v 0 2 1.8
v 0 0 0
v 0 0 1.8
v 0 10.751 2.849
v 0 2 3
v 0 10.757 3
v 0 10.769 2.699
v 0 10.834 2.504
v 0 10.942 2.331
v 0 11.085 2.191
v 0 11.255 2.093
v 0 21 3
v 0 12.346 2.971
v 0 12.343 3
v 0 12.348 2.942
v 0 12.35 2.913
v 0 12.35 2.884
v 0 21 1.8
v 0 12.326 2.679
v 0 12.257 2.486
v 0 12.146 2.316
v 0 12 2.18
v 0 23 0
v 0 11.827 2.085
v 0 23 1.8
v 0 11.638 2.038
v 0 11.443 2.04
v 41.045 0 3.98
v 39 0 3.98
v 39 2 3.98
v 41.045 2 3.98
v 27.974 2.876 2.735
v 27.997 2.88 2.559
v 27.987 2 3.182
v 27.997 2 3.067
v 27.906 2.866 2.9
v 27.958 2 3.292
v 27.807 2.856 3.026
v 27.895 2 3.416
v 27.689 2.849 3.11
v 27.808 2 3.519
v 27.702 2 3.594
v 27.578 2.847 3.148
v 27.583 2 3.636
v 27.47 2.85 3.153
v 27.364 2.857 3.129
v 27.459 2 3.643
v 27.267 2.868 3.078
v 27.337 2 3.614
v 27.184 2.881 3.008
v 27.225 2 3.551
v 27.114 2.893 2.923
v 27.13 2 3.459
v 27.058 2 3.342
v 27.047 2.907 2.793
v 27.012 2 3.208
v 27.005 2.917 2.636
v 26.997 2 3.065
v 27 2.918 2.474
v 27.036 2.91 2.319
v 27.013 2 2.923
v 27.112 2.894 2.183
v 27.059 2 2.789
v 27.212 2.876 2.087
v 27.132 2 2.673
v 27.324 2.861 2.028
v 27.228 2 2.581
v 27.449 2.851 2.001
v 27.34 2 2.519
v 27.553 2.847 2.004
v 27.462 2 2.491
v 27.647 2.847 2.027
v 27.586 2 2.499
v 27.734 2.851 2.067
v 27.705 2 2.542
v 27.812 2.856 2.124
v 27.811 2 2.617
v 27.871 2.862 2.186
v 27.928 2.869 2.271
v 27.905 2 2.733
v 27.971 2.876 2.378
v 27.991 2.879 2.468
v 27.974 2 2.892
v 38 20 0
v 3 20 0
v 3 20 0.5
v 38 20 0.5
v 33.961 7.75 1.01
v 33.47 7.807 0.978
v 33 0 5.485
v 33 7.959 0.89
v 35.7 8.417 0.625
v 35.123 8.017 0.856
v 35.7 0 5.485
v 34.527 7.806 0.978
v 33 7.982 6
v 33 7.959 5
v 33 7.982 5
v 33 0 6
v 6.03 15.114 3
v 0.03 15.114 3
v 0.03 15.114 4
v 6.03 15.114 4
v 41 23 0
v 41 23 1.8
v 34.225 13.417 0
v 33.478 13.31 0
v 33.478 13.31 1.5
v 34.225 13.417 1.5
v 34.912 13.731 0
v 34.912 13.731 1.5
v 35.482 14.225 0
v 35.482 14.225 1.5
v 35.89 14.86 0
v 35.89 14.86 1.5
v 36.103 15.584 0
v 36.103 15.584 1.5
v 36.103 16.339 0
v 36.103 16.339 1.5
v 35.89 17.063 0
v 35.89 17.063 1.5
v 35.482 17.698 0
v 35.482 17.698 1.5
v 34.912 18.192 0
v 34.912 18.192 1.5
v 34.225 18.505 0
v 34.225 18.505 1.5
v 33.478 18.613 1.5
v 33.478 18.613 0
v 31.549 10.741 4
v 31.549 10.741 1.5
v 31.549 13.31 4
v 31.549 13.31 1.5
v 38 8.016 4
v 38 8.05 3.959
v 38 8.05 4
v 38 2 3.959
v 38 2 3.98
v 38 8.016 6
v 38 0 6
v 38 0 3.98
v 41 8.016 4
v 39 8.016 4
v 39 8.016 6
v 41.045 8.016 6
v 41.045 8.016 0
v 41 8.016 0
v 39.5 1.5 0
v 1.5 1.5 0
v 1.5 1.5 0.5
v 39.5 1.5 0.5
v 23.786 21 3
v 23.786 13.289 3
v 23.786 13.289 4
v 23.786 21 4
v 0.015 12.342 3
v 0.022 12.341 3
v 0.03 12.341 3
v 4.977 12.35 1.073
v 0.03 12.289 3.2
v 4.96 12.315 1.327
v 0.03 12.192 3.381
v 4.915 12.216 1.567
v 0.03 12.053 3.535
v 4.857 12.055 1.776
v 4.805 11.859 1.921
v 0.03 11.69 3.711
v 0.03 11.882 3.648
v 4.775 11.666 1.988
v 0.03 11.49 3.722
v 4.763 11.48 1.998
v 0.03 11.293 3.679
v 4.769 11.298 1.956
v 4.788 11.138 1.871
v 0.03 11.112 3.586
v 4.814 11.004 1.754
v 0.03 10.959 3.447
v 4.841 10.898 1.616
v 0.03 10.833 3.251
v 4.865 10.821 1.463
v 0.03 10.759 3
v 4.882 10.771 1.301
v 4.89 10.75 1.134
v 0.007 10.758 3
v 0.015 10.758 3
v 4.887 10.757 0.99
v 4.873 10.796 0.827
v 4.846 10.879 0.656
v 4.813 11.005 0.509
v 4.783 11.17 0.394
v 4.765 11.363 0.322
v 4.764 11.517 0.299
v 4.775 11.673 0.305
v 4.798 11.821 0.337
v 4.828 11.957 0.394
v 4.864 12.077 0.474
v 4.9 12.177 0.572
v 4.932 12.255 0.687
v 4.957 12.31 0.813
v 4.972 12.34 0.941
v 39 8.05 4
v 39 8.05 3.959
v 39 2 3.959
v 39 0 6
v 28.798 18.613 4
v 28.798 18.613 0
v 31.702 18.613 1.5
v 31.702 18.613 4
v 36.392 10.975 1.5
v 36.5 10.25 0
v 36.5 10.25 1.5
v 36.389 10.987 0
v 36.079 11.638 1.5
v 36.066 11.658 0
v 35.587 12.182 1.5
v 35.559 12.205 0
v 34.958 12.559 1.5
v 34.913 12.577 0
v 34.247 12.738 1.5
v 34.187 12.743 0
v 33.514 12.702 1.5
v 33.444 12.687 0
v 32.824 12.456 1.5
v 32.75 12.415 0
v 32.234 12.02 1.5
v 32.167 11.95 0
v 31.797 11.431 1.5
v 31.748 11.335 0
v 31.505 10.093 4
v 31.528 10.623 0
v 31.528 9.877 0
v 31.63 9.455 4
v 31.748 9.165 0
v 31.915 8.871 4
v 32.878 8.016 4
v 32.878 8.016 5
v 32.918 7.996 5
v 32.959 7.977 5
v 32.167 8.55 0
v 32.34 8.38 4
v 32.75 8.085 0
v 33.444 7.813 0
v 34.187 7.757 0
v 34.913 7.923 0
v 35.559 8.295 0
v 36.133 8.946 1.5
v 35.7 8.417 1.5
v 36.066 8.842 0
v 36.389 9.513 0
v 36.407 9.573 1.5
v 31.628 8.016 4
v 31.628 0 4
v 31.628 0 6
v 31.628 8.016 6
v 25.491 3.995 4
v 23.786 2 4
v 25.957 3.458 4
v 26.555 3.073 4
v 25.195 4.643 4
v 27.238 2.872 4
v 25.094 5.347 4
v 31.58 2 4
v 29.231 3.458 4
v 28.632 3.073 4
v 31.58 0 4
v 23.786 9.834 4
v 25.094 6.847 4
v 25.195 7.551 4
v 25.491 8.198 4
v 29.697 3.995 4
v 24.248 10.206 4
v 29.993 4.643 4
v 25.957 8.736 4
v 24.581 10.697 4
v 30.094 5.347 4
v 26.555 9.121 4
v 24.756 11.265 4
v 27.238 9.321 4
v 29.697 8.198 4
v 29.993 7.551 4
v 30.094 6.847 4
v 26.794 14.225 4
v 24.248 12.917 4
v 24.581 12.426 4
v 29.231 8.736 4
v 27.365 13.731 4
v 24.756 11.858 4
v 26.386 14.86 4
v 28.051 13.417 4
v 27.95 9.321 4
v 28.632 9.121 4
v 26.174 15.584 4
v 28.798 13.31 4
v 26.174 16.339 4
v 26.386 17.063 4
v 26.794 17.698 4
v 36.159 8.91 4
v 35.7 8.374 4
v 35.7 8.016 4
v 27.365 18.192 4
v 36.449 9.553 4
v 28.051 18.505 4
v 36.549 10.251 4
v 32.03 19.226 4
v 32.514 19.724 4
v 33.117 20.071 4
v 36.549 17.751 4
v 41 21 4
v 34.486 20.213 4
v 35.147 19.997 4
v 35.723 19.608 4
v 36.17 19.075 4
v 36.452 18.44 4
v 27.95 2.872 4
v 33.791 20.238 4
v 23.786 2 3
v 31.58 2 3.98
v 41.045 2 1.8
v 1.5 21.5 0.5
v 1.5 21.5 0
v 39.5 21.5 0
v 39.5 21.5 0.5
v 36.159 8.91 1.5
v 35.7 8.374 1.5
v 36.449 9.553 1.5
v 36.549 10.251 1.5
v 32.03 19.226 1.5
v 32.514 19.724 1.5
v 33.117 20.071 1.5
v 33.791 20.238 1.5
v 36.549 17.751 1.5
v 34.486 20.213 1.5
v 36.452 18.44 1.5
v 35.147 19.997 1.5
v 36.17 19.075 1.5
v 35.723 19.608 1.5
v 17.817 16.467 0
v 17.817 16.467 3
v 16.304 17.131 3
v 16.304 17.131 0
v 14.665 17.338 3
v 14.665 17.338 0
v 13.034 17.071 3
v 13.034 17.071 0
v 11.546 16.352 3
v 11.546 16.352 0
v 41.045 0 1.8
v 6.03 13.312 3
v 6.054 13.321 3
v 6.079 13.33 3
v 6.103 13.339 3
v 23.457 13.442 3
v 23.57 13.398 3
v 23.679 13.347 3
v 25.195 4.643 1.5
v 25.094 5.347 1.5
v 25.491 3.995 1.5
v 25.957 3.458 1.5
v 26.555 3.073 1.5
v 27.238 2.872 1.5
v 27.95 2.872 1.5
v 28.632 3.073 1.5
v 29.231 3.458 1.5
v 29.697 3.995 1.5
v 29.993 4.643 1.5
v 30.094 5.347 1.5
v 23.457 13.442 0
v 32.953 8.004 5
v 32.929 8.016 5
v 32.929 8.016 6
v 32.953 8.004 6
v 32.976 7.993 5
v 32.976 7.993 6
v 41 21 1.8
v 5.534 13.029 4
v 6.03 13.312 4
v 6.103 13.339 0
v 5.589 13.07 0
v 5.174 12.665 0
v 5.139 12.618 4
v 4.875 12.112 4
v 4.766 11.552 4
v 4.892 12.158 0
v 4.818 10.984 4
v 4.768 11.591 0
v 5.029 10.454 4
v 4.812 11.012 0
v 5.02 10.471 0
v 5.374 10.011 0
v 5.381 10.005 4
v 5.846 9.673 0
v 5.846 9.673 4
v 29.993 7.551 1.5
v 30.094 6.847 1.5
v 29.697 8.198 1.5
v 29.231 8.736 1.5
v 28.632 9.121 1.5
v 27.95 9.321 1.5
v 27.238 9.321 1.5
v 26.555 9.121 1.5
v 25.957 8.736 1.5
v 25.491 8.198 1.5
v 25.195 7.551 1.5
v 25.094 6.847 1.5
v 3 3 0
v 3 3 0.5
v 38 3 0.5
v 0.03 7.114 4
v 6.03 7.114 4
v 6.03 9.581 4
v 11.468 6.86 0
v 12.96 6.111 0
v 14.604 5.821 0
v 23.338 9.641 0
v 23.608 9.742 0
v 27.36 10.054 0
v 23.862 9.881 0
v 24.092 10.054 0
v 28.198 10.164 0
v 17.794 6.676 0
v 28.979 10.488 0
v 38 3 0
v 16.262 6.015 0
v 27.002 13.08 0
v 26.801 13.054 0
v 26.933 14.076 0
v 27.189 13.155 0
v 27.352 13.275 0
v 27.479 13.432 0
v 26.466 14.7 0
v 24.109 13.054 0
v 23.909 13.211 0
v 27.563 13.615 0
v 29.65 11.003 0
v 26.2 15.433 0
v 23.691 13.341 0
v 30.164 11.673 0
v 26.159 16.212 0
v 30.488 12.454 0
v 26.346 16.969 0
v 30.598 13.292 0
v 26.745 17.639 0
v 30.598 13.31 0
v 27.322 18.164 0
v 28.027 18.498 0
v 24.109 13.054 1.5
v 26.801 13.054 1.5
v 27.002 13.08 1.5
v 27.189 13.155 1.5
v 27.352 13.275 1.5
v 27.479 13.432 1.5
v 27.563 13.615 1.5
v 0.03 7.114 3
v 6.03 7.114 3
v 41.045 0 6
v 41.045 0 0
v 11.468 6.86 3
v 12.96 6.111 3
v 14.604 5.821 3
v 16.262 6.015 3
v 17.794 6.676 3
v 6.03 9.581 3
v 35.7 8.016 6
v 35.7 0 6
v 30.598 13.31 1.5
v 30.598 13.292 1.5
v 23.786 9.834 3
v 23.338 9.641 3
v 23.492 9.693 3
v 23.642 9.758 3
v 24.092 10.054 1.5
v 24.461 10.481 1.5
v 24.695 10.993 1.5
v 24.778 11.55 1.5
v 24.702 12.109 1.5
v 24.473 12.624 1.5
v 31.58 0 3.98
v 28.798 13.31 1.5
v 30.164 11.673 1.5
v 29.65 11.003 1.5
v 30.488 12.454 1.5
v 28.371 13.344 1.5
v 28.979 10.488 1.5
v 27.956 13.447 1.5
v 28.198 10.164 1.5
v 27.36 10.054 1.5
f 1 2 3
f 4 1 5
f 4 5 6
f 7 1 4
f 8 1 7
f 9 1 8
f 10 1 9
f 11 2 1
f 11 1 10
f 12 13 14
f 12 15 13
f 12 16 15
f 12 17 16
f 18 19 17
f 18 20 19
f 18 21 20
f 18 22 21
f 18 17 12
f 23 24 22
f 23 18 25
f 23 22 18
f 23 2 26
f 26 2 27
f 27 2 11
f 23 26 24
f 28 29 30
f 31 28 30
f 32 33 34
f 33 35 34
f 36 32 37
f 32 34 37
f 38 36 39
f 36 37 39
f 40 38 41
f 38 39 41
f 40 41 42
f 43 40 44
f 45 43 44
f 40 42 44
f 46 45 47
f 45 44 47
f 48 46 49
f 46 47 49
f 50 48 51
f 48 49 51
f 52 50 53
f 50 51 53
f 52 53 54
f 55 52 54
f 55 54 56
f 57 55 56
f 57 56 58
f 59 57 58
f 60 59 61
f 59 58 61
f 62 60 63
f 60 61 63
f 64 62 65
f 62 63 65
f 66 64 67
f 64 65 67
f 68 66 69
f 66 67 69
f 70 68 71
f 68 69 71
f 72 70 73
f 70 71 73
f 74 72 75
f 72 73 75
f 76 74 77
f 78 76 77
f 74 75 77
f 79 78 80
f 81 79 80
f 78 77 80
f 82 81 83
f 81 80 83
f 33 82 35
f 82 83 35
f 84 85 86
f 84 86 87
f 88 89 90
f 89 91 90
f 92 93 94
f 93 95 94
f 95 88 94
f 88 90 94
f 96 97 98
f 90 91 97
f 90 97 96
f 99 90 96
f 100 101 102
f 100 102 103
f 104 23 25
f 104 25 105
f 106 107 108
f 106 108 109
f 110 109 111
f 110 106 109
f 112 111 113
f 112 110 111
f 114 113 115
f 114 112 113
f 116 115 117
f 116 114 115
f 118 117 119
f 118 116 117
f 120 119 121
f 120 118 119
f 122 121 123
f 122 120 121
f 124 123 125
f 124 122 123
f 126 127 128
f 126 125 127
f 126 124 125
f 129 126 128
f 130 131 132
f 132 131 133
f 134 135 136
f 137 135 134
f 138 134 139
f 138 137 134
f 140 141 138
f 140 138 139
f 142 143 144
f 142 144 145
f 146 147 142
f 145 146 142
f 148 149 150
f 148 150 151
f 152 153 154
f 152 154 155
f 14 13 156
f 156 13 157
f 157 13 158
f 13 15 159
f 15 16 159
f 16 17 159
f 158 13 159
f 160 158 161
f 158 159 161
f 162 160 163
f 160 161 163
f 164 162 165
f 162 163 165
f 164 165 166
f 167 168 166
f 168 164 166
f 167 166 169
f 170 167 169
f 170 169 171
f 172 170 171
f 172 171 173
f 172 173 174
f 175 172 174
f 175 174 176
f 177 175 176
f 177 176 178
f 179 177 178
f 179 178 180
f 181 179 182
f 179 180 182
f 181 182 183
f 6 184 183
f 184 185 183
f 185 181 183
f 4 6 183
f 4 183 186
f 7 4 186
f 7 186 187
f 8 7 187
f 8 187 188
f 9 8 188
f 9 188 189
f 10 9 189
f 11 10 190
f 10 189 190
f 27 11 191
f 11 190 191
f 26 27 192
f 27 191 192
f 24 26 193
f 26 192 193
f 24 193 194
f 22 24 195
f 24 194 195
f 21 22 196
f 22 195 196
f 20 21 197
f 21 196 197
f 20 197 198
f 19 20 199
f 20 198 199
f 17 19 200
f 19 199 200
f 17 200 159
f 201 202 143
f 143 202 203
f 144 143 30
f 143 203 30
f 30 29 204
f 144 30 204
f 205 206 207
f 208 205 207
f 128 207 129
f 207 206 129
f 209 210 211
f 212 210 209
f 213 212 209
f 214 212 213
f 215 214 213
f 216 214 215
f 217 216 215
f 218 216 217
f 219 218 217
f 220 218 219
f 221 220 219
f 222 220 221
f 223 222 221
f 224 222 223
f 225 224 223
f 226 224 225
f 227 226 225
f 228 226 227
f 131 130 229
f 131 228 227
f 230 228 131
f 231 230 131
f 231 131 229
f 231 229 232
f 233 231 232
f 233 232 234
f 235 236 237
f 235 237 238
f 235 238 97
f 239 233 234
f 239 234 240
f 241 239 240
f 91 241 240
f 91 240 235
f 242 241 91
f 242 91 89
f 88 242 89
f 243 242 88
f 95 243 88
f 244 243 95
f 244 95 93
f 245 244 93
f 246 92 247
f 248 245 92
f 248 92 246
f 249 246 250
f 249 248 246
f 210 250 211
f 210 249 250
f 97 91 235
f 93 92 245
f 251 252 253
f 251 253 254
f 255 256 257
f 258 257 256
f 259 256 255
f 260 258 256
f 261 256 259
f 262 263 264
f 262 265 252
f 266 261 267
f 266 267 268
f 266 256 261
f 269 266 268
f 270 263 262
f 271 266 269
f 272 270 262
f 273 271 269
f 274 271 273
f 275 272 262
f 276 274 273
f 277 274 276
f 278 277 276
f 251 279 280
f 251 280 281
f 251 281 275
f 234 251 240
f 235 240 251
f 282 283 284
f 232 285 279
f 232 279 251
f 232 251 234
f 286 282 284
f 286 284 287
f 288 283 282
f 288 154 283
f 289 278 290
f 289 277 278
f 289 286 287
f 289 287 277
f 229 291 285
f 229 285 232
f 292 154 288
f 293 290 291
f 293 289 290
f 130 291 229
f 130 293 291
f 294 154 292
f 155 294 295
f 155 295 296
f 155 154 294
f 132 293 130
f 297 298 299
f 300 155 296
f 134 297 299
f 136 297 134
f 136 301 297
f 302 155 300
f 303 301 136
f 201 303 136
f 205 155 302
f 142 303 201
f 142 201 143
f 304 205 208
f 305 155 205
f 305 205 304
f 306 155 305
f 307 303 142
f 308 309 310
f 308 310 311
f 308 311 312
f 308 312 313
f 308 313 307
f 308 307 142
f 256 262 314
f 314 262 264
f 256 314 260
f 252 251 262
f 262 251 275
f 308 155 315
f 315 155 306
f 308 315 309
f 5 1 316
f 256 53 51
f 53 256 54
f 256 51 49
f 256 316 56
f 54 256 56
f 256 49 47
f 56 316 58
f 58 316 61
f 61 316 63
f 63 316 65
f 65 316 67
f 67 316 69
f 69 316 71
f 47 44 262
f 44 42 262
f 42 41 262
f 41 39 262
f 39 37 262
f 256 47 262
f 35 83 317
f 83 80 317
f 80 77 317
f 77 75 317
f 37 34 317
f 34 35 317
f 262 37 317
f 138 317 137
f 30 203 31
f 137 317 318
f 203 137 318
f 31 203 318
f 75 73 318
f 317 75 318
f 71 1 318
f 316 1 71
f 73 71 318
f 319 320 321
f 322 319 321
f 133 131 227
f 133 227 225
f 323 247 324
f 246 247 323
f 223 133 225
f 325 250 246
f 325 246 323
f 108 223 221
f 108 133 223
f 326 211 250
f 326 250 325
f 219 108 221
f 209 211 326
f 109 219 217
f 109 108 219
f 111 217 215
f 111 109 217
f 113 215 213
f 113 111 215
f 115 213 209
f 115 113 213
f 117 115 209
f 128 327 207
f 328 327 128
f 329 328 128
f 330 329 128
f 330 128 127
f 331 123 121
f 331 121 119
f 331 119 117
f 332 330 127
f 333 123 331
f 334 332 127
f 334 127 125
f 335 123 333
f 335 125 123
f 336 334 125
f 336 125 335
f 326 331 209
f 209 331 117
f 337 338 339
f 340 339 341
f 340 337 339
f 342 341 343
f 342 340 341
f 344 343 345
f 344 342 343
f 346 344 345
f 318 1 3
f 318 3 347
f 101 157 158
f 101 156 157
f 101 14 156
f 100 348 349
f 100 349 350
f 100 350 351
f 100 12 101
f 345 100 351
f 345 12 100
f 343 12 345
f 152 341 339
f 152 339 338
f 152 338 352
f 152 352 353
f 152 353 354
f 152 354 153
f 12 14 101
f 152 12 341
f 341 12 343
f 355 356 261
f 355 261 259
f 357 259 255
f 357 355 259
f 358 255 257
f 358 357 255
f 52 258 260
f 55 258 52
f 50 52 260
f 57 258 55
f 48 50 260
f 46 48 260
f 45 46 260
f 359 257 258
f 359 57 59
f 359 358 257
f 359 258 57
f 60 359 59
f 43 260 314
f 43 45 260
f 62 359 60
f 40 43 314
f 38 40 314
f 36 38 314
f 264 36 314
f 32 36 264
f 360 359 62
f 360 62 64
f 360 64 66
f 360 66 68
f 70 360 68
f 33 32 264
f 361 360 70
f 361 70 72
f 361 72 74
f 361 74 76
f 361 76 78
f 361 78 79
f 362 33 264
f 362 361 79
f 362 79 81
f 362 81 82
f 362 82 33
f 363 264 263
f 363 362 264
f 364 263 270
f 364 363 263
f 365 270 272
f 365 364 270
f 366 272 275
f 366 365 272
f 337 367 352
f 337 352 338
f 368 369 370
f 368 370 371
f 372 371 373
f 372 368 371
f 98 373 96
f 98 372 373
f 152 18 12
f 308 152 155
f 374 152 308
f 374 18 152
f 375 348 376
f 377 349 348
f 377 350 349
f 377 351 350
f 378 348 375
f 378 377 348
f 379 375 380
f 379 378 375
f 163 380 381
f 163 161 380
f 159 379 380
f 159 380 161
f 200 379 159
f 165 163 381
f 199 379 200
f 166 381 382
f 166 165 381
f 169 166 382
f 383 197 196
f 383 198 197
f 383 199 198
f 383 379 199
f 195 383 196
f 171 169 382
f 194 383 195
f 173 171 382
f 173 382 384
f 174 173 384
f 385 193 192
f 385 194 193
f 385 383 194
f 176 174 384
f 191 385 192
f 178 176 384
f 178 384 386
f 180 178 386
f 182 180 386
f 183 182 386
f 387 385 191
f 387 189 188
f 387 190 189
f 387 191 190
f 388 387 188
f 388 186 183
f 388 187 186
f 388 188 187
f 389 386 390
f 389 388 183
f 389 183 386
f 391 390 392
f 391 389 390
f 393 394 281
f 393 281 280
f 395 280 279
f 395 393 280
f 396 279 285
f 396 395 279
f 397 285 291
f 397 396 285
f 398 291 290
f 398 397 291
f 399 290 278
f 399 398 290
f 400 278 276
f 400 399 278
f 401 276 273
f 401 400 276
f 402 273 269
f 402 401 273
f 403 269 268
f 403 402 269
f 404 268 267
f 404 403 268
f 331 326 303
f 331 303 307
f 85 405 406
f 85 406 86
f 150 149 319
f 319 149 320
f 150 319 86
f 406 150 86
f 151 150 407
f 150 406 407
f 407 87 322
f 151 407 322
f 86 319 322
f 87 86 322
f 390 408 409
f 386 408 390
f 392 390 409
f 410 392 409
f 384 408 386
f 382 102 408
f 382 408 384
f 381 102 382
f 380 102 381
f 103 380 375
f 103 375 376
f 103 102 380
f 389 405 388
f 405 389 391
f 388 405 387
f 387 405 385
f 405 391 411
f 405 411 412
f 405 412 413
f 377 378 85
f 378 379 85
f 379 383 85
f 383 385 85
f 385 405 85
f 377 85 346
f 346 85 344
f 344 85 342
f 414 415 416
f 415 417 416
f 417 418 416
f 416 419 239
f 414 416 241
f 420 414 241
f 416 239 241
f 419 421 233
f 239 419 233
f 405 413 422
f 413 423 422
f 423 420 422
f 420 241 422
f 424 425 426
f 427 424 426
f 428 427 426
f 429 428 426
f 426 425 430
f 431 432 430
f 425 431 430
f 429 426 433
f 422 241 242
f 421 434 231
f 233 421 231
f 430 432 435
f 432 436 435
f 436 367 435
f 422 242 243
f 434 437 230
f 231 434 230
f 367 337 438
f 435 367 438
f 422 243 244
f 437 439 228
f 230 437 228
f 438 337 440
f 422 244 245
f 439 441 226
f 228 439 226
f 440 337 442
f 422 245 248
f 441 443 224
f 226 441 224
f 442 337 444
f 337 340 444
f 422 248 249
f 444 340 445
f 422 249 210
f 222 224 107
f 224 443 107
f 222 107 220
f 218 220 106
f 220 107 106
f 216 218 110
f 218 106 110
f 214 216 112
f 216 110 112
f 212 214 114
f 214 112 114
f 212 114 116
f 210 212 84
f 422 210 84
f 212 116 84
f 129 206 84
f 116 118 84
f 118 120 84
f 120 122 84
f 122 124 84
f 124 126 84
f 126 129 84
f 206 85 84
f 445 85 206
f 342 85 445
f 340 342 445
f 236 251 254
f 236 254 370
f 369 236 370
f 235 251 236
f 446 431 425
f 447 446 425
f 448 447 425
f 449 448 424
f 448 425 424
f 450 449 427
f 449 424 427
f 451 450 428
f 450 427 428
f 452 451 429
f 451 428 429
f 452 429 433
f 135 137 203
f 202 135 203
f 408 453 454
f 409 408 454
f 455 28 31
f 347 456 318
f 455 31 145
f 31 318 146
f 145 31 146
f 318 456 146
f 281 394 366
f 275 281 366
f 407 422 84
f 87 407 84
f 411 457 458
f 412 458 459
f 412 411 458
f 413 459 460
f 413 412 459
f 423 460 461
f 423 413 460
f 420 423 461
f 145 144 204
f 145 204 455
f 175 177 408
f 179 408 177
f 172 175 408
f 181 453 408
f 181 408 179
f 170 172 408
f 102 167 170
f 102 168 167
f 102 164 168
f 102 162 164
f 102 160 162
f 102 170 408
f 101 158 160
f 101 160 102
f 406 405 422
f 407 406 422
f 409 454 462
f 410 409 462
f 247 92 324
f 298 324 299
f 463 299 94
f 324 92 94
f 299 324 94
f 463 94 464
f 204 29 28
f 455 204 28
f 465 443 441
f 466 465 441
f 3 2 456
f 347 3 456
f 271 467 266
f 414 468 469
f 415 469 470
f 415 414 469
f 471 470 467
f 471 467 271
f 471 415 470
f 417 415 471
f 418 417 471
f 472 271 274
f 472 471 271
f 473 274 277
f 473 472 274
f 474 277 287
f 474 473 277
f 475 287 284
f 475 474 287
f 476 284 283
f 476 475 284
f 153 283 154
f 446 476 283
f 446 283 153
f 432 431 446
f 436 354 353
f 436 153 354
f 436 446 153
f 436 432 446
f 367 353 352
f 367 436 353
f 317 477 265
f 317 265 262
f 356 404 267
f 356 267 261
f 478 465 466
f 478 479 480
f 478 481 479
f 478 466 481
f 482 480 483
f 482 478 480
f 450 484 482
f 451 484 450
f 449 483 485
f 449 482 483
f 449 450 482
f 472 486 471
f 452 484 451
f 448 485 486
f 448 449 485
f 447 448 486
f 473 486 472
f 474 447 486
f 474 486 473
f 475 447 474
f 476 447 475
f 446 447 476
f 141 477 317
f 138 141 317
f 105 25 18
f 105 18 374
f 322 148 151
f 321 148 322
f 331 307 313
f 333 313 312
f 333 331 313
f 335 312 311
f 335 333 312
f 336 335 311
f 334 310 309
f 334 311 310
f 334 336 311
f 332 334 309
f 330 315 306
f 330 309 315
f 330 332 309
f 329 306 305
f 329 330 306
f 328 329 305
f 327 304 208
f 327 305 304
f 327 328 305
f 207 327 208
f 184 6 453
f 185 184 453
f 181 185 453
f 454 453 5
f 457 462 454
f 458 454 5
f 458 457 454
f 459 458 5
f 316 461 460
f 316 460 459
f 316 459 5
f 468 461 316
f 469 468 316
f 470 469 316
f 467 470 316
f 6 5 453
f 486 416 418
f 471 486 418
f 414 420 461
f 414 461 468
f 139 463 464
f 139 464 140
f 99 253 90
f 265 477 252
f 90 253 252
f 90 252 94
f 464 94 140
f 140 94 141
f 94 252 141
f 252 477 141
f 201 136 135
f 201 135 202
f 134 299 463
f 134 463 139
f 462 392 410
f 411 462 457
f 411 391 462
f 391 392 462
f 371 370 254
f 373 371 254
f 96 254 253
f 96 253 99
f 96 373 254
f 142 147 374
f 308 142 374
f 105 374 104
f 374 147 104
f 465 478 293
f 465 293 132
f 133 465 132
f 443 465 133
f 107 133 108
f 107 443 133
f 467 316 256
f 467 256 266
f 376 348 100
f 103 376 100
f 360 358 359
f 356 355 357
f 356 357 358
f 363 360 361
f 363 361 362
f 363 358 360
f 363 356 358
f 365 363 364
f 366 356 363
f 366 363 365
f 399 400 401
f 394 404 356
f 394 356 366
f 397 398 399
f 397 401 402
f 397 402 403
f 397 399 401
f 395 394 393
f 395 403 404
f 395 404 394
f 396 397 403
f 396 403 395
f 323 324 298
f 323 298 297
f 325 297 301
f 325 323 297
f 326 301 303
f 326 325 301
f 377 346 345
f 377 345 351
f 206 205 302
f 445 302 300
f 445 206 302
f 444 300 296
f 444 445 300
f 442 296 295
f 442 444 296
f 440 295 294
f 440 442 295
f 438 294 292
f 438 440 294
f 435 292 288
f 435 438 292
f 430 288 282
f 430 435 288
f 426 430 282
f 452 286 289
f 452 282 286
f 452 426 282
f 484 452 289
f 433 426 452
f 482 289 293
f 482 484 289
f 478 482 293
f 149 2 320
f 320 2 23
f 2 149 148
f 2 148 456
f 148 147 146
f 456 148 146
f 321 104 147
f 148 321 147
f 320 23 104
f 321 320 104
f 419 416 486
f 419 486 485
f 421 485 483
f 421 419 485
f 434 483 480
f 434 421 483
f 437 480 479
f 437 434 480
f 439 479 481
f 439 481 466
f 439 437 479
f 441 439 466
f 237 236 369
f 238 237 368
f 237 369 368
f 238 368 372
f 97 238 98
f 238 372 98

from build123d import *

# Parameters (mm, degrees)
SKETCH008_W          = 9.417664
SKETCH008_H          = 8.015827
PAD_DEPTH            = 6
SKETCH007_W          = 17.214357
SKETCH007_H          = 23
PAD001_DEPTH         = 4
SKETCH_W             = 41
SKETCH_H             = 23
PAD002_DEPTH         = 3
SKETCH009_W          = 6
SKETCH009_H          = 8
PAD003_DEPTH         = 4
POCKET_DEPTH         = 1.5
POCKET001_DEPTH      = 5
POCKET002_DEPTH      = 5
POCKET003_DEPTH      = 5
POCKET004_DEPTH      = 5
SKETCH004_R          = 2.5
POCKET005_DEPTH      = 5
SKETCH010_W          = 41
SKETCH010_H          = 2
SKETCH010_W_2        = 31.58
POCKET006_DEPTH      = 5
SKETCH013_W          = 2
SKETCH013_H          = 2.18
POCKET007_DEPTH      = 10
SKETCH014_W          = 2.7
SKETCH014_H          = 5
POCKET008_DEPTH      = 10
POCKET008_DEPTH_BACK = 10
SKETCH015_W          = 1
SKETCH015_H          = 2.1
POCKET009_DEPTH      = 8.05
SKETCH012_R          = 0.8
POCKET010_DEPTH      = 8
SKETCH016_R          = 0.5
POCKET011_DEPTH      = 1
SKETCH017_W          = 38
SKETCH017_H          = 20
SKETCH017_W_2        = 35
SKETCH017_H_2        = 17
POCKET012_DEPTH      = 0.5


with BuildPart() as part:
    # Sketch008 → Pad (new body)
    with BuildSketch(Plane.XY):
        with Locations((36.336342, 4.0079135)):
            Rectangle(SKETCH008_W, SKETCH008_H)
    extrude(amount=PAD_DEPTH)

    # Sketch007 → Pad001 (join)
    with BuildSketch(Plane.XY):
        with Locations((32.3928215, 11.5)):
            Rectangle(SKETCH007_W, SKETCH007_H)
    extrude(amount=PAD001_DEPTH)

    # Sketch → Pad002 (join)
    with BuildSketch(Plane.XY):
        with Locations((20.5, 11.5)):
            Rectangle(SKETCH_W, SKETCH_H)
    extrude(amount=PAD002_DEPTH)

    # Sketch009 → Pad003 (join)
    with BuildSketch(Plane.XY):
        with Locations((3.029941472, 11.1135029832)):
            Rectangle(SKETCH009_W, SKETCH009_H)
    extrude(amount=PAD003_DEPTH)

    # Sketch003 → Pocket (cut)
    with BuildSketch(Plane.XY):
        with BuildLine():
            Line((23.975689, 13.0540965715), (26.8011965151, 13.0540965715))
            ThreePointArc((26.8011965151, 13.0540965715), (27.3647082361, 13.2875107689), (27.5981224335, 13.8510224899))
            Line((27.5981224335, 13.8510224899), (27.5981224335, 14.526678))
            Line((27.5981224335, 14.526678), (30.5981224335, 14.526678))
            Line((30.5981224335, 14.526678), (30.5981224335, 13.2924514667))
            ThreePointArc((27.3597675383, 10.0540965715), (29.6496302446, 11.0025887604), (30.5981224335, 13.2924514667))
            Line((27.3597675383, 10.0540965715), (23.975689, 10.0540965715))
            Line((23.975689, 10.0540965715), (23.975689, 13.0540965715))
        make_face()
    extrude(amount=POCKET_DEPTH, mode=Mode.SUBTRACT)

    # Sketch001 → Pocket001 (cut)
    with BuildSketch(Plane.XY):
        with BuildLine():
            ThreePointArc((6.1032483008, 13.3387395872), (4.7679879703, 11.5907435275), (5.8459964121, 9.6733734082))
            Line((5.8459964121, 9.6733734082), (11.4677626675, 6.8598227367))
            ThreePointArc((11.4677626675, 6.8598227367), (14.6035600083, 5.8212239037), (17.794301339, 6.6762573881))
            Line((17.794301339, 6.6762573881), (23.3375945955, 9.6414256942))
            ThreePointArc((23.3375945955, 9.6414256942), (24.7768585387, 11.4984422833), (23.4574990247, 13.4424797786))
            Line((23.4574990247, 13.4424797786), (17.8173054197, 16.4670815869))
            ThreePointArc((17.8173054197, 16.4670815869), (14.6646196223, 17.3378254465), (11.5461110533, 16.3516576556))
            Line((11.5461110533, 16.3516576556), (6.1032483008, 13.3387395872))
        make_face()
    extrude(amount=POCKET001_DEPTH, mode=Mode.SUBTRACT)

    # Sketch006 → Pocket002 (cut)
    with BuildSketch(Plane.XY.offset(1.5)):
        with BuildLine():
            ThreePointArc((30.093781, 6.846887), (27.593781, 9.346887), (25.093781, 6.846887))
            Line((25.093781, 6.846887), (25.093781, 5.346887))
            ThreePointArc((25.093781, 5.346887), (27.593781, 2.846887), (30.093781, 5.346887))
            Line((30.093781, 6.846887), (30.093781, 5.346887))
        make_face()
    extrude(amount=POCKET002_DEPTH, mode=Mode.SUBTRACT)

    # Sketch005 → Pocket003 (cut)
    with BuildSketch(Plane.XY.offset(1.5)):
        with BuildLine():
            ThreePointArc((31.548714, 10.251081), (34.048714, 7.751081), (36.548714, 10.251081))
            Line((36.548714, 10.251081), (36.548714, 17.751081))
            ThreePointArc((36.548714, 17.751081), (34.048714, 20.251081), (31.548714, 17.751081))
            Line((31.548714, 10.251081), (31.548714, 17.751081))
        make_face()
    extrude(amount=POCKET003_DEPTH, mode=Mode.SUBTRACT)

    # Sketch002 → Pocket004 (cut)
    with BuildSketch(Plane.XY):
        with BuildLine():
            ThreePointArc((28.798038, 18.6125900268), (26.1467217956, 15.9612738224), (28.798038, 13.3099576181))
            Line((28.798038, 13.309957618), (33.4782685239, 13.309957618))
            ThreePointArc((33.4782685239, 13.3099576181), (36.1295847282, 15.9612738224), (33.4782685239, 18.6125900268))
            Line((28.798038, 18.6125900268), (33.4782685239, 18.6125900268))
        make_face()
    extrude(amount=POCKET004_DEPTH, mode=Mode.SUBTRACT)

    # Sketch004 → Pocket005 (cut)
    with BuildSketch(Plane.XY):
        with Locations((34, 10.25)):
            Circle(SKETCH004_R)
    extrude(amount=POCKET005_DEPTH, mode=Mode.SUBTRACT)

    # Sketch010 → Pocket006 (cut)
    with BuildSketch(Plane.XY.offset(1.8)):
        with Locations((20.5, 22)):
            Rectangle(SKETCH010_W, SKETCH010_H)
        with Locations((15.79, 1)):
            Rectangle(SKETCH010_W_2, SKETCH010_H)
    extrude(amount=POCKET006_DEPTH, mode=Mode.SUBTRACT)

    # Sketch013 → Pocket007 (cut)
    with BuildSketch(Plane.YZ.offset(31.58)):
        with Locations((1, 2.89)):
            Rectangle(SKETCH013_W, SKETCH013_H)
    extrude(amount=POCKET007_DEPTH, mode=Mode.SUBTRACT)

    # Sketch014 → Pocket008 (cut, two sides)
    with BuildSketch(Plane(origin=(0, -2.5, 0), x_dir=(1, 0, 0), z_dir=(0, -0.8660254038, 0.5))) as pocket008_sk:
        with Locations((34.35, 8.5)):
            Rectangle(SKETCH014_W, SKETCH014_H)
    extrude(amount=-POCKET008_DEPTH, mode=Mode.SUBTRACT)
    extrude(pocket008_sk.sketch, amount=POCKET008_DEPTH_BACK, mode=Mode.SUBTRACT)

    # Sketch015 → Pocket009 (cut)
    with BuildSketch(Plane.XZ):
        with Locations((38.5, 5.0085653562)):
            Rectangle(SKETCH015_W, SKETCH015_H)
    extrude(amount=-POCKET009_DEPTH, mode=Mode.SUBTRACT)

    # Sketch012 → Pocket010 (cut)
    with BuildSketch(Plane(origin=(5, 0, 0), x_dir=(0, 1, 0), z_dir=(0.9396926208, 0, -0.3420201433))):
        with Locations((11.55, 1)):
            Circle(SKETCH012_R)
    extrude(amount=-POCKET010_DEPTH, mode=Mode.SUBTRACT)

    # Sketch016 → Pocket011 (cut, symmetric)
    with BuildSketch(Plane(origin=(0, 1, 0.2), x_dir=(1, 0, 0), z_dir=(0, -0.8660254038, 0.5))):
        with Locations((27.497313, 2.982959)):
            Circle(SKETCH016_R)
    extrude(amount=POCKET011_DEPTH, both=True, mode=Mode.SUBTRACT)

    # Sketch017 → Pocket012 (cut)
    with BuildSketch(Plane.XY):
        with Locations((20.5, 11.5)):
            Rectangle(SKETCH017_W, SKETCH017_H)
        with Locations((20.5, 11.5)):
            Rectangle(SKETCH017_W_2, SKETCH017_H_2, mode=Mode.SUBTRACT)
    extrude(amount=POCKET012_DEPTH, mode=Mode.SUBTRACT)


solid = part.part
